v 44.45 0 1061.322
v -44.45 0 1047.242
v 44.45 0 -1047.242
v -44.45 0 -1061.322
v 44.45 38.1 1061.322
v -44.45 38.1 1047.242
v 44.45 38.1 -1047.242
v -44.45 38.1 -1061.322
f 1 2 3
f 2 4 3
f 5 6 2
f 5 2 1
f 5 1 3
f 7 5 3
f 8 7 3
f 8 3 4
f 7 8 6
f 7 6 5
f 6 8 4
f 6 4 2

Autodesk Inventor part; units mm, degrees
ref_plane "YZ Plane" through (0, 0, 0) normal (1, 0, 0) x (0, 1, 0)
ref_plane "XZ Plane" through (0, 0, 0) normal (0, 1, 0) x (-1, 0, 0)
ref_plane "XY Plane" through (0, 0, 0) normal (0, 0, 1) x (1, 0, 0)
sketch "Sketch1" plane through (0, 0, 0) normal (0, 1, 0) x (-1, 0, 0)
  line L0 (-44.45, 1047.242) -> (-44.45, -1047.242)
  line L1 (-44.45, -1047.242) -> (44.45, -1047.242)
  line L2 (44.45, -1047.242) -> (44.45, 1047.242)
  line L3 (44.45, 1047.242) -> (-44.45, 1047.242)
  line L4 (-44.45, 1047.242) -> (44.45, -1047.242) construction
  line L5 (-44.45, -1047.242) -> (44.45, 1047.242) construction
  point P0 (0, 0)
  dimension "d0" = 2094.484
  dimension "d1" = 88.9
extrude "Extrusion1" add sketch "Sketch1" along normal blind 38.1
sketch "Sketch4" plane through (0, 38.1, 0) normal (0, 1, 0) x (1, 0, 0)
  line L0 (-44.45, 1047.242) -> (-44.45, -1047.242) projected
  line L1 (-44.45, -1047.242) -> (44.45, -1061.3224)
  line L2 (44.45, -1047.242) -> (44.45, 1047.242) projected
  line L3 (44.45, -1061.3224) -> (44.45, -1047.242)
  line L4 (-44.45, -1047.242) -> (44.45, -1047.242) projected
  point P0 (0, 0)
  dimension "d8" = 9
extrude "Extrusion3" add sketch "Sketch4" against normal blind 38.1
sketch "Sketch5" plane through (0, 38.1, 0) normal (0, 1, 0) x (1, 0, 0)
  line L0 (44.45, -1061.3224) -> (44.45, 1047.242) projected
  line L1 (44.45, 1047.242) -> (-44.45, 1061.3224)
  line L2 (44.45, 1047.242) -> (-44.45, 1047.242) projected
  line L3 (-44.45, 1061.3224) -> (-44.45, 1047.242)
  line L4 (-44.45, 1047.242) -> (44.45, 1047.242)
  line L5 (-44.45, 1047.242) -> (-44.45, -1047.242) projected
  point P0 (0, 0)
  dimension "d11" = 9
extrude "Extrusion4" add sketch "Sketch5" against normal blind 38.1
properties part number "Back 2x4" material "Wood (Walnut)"
